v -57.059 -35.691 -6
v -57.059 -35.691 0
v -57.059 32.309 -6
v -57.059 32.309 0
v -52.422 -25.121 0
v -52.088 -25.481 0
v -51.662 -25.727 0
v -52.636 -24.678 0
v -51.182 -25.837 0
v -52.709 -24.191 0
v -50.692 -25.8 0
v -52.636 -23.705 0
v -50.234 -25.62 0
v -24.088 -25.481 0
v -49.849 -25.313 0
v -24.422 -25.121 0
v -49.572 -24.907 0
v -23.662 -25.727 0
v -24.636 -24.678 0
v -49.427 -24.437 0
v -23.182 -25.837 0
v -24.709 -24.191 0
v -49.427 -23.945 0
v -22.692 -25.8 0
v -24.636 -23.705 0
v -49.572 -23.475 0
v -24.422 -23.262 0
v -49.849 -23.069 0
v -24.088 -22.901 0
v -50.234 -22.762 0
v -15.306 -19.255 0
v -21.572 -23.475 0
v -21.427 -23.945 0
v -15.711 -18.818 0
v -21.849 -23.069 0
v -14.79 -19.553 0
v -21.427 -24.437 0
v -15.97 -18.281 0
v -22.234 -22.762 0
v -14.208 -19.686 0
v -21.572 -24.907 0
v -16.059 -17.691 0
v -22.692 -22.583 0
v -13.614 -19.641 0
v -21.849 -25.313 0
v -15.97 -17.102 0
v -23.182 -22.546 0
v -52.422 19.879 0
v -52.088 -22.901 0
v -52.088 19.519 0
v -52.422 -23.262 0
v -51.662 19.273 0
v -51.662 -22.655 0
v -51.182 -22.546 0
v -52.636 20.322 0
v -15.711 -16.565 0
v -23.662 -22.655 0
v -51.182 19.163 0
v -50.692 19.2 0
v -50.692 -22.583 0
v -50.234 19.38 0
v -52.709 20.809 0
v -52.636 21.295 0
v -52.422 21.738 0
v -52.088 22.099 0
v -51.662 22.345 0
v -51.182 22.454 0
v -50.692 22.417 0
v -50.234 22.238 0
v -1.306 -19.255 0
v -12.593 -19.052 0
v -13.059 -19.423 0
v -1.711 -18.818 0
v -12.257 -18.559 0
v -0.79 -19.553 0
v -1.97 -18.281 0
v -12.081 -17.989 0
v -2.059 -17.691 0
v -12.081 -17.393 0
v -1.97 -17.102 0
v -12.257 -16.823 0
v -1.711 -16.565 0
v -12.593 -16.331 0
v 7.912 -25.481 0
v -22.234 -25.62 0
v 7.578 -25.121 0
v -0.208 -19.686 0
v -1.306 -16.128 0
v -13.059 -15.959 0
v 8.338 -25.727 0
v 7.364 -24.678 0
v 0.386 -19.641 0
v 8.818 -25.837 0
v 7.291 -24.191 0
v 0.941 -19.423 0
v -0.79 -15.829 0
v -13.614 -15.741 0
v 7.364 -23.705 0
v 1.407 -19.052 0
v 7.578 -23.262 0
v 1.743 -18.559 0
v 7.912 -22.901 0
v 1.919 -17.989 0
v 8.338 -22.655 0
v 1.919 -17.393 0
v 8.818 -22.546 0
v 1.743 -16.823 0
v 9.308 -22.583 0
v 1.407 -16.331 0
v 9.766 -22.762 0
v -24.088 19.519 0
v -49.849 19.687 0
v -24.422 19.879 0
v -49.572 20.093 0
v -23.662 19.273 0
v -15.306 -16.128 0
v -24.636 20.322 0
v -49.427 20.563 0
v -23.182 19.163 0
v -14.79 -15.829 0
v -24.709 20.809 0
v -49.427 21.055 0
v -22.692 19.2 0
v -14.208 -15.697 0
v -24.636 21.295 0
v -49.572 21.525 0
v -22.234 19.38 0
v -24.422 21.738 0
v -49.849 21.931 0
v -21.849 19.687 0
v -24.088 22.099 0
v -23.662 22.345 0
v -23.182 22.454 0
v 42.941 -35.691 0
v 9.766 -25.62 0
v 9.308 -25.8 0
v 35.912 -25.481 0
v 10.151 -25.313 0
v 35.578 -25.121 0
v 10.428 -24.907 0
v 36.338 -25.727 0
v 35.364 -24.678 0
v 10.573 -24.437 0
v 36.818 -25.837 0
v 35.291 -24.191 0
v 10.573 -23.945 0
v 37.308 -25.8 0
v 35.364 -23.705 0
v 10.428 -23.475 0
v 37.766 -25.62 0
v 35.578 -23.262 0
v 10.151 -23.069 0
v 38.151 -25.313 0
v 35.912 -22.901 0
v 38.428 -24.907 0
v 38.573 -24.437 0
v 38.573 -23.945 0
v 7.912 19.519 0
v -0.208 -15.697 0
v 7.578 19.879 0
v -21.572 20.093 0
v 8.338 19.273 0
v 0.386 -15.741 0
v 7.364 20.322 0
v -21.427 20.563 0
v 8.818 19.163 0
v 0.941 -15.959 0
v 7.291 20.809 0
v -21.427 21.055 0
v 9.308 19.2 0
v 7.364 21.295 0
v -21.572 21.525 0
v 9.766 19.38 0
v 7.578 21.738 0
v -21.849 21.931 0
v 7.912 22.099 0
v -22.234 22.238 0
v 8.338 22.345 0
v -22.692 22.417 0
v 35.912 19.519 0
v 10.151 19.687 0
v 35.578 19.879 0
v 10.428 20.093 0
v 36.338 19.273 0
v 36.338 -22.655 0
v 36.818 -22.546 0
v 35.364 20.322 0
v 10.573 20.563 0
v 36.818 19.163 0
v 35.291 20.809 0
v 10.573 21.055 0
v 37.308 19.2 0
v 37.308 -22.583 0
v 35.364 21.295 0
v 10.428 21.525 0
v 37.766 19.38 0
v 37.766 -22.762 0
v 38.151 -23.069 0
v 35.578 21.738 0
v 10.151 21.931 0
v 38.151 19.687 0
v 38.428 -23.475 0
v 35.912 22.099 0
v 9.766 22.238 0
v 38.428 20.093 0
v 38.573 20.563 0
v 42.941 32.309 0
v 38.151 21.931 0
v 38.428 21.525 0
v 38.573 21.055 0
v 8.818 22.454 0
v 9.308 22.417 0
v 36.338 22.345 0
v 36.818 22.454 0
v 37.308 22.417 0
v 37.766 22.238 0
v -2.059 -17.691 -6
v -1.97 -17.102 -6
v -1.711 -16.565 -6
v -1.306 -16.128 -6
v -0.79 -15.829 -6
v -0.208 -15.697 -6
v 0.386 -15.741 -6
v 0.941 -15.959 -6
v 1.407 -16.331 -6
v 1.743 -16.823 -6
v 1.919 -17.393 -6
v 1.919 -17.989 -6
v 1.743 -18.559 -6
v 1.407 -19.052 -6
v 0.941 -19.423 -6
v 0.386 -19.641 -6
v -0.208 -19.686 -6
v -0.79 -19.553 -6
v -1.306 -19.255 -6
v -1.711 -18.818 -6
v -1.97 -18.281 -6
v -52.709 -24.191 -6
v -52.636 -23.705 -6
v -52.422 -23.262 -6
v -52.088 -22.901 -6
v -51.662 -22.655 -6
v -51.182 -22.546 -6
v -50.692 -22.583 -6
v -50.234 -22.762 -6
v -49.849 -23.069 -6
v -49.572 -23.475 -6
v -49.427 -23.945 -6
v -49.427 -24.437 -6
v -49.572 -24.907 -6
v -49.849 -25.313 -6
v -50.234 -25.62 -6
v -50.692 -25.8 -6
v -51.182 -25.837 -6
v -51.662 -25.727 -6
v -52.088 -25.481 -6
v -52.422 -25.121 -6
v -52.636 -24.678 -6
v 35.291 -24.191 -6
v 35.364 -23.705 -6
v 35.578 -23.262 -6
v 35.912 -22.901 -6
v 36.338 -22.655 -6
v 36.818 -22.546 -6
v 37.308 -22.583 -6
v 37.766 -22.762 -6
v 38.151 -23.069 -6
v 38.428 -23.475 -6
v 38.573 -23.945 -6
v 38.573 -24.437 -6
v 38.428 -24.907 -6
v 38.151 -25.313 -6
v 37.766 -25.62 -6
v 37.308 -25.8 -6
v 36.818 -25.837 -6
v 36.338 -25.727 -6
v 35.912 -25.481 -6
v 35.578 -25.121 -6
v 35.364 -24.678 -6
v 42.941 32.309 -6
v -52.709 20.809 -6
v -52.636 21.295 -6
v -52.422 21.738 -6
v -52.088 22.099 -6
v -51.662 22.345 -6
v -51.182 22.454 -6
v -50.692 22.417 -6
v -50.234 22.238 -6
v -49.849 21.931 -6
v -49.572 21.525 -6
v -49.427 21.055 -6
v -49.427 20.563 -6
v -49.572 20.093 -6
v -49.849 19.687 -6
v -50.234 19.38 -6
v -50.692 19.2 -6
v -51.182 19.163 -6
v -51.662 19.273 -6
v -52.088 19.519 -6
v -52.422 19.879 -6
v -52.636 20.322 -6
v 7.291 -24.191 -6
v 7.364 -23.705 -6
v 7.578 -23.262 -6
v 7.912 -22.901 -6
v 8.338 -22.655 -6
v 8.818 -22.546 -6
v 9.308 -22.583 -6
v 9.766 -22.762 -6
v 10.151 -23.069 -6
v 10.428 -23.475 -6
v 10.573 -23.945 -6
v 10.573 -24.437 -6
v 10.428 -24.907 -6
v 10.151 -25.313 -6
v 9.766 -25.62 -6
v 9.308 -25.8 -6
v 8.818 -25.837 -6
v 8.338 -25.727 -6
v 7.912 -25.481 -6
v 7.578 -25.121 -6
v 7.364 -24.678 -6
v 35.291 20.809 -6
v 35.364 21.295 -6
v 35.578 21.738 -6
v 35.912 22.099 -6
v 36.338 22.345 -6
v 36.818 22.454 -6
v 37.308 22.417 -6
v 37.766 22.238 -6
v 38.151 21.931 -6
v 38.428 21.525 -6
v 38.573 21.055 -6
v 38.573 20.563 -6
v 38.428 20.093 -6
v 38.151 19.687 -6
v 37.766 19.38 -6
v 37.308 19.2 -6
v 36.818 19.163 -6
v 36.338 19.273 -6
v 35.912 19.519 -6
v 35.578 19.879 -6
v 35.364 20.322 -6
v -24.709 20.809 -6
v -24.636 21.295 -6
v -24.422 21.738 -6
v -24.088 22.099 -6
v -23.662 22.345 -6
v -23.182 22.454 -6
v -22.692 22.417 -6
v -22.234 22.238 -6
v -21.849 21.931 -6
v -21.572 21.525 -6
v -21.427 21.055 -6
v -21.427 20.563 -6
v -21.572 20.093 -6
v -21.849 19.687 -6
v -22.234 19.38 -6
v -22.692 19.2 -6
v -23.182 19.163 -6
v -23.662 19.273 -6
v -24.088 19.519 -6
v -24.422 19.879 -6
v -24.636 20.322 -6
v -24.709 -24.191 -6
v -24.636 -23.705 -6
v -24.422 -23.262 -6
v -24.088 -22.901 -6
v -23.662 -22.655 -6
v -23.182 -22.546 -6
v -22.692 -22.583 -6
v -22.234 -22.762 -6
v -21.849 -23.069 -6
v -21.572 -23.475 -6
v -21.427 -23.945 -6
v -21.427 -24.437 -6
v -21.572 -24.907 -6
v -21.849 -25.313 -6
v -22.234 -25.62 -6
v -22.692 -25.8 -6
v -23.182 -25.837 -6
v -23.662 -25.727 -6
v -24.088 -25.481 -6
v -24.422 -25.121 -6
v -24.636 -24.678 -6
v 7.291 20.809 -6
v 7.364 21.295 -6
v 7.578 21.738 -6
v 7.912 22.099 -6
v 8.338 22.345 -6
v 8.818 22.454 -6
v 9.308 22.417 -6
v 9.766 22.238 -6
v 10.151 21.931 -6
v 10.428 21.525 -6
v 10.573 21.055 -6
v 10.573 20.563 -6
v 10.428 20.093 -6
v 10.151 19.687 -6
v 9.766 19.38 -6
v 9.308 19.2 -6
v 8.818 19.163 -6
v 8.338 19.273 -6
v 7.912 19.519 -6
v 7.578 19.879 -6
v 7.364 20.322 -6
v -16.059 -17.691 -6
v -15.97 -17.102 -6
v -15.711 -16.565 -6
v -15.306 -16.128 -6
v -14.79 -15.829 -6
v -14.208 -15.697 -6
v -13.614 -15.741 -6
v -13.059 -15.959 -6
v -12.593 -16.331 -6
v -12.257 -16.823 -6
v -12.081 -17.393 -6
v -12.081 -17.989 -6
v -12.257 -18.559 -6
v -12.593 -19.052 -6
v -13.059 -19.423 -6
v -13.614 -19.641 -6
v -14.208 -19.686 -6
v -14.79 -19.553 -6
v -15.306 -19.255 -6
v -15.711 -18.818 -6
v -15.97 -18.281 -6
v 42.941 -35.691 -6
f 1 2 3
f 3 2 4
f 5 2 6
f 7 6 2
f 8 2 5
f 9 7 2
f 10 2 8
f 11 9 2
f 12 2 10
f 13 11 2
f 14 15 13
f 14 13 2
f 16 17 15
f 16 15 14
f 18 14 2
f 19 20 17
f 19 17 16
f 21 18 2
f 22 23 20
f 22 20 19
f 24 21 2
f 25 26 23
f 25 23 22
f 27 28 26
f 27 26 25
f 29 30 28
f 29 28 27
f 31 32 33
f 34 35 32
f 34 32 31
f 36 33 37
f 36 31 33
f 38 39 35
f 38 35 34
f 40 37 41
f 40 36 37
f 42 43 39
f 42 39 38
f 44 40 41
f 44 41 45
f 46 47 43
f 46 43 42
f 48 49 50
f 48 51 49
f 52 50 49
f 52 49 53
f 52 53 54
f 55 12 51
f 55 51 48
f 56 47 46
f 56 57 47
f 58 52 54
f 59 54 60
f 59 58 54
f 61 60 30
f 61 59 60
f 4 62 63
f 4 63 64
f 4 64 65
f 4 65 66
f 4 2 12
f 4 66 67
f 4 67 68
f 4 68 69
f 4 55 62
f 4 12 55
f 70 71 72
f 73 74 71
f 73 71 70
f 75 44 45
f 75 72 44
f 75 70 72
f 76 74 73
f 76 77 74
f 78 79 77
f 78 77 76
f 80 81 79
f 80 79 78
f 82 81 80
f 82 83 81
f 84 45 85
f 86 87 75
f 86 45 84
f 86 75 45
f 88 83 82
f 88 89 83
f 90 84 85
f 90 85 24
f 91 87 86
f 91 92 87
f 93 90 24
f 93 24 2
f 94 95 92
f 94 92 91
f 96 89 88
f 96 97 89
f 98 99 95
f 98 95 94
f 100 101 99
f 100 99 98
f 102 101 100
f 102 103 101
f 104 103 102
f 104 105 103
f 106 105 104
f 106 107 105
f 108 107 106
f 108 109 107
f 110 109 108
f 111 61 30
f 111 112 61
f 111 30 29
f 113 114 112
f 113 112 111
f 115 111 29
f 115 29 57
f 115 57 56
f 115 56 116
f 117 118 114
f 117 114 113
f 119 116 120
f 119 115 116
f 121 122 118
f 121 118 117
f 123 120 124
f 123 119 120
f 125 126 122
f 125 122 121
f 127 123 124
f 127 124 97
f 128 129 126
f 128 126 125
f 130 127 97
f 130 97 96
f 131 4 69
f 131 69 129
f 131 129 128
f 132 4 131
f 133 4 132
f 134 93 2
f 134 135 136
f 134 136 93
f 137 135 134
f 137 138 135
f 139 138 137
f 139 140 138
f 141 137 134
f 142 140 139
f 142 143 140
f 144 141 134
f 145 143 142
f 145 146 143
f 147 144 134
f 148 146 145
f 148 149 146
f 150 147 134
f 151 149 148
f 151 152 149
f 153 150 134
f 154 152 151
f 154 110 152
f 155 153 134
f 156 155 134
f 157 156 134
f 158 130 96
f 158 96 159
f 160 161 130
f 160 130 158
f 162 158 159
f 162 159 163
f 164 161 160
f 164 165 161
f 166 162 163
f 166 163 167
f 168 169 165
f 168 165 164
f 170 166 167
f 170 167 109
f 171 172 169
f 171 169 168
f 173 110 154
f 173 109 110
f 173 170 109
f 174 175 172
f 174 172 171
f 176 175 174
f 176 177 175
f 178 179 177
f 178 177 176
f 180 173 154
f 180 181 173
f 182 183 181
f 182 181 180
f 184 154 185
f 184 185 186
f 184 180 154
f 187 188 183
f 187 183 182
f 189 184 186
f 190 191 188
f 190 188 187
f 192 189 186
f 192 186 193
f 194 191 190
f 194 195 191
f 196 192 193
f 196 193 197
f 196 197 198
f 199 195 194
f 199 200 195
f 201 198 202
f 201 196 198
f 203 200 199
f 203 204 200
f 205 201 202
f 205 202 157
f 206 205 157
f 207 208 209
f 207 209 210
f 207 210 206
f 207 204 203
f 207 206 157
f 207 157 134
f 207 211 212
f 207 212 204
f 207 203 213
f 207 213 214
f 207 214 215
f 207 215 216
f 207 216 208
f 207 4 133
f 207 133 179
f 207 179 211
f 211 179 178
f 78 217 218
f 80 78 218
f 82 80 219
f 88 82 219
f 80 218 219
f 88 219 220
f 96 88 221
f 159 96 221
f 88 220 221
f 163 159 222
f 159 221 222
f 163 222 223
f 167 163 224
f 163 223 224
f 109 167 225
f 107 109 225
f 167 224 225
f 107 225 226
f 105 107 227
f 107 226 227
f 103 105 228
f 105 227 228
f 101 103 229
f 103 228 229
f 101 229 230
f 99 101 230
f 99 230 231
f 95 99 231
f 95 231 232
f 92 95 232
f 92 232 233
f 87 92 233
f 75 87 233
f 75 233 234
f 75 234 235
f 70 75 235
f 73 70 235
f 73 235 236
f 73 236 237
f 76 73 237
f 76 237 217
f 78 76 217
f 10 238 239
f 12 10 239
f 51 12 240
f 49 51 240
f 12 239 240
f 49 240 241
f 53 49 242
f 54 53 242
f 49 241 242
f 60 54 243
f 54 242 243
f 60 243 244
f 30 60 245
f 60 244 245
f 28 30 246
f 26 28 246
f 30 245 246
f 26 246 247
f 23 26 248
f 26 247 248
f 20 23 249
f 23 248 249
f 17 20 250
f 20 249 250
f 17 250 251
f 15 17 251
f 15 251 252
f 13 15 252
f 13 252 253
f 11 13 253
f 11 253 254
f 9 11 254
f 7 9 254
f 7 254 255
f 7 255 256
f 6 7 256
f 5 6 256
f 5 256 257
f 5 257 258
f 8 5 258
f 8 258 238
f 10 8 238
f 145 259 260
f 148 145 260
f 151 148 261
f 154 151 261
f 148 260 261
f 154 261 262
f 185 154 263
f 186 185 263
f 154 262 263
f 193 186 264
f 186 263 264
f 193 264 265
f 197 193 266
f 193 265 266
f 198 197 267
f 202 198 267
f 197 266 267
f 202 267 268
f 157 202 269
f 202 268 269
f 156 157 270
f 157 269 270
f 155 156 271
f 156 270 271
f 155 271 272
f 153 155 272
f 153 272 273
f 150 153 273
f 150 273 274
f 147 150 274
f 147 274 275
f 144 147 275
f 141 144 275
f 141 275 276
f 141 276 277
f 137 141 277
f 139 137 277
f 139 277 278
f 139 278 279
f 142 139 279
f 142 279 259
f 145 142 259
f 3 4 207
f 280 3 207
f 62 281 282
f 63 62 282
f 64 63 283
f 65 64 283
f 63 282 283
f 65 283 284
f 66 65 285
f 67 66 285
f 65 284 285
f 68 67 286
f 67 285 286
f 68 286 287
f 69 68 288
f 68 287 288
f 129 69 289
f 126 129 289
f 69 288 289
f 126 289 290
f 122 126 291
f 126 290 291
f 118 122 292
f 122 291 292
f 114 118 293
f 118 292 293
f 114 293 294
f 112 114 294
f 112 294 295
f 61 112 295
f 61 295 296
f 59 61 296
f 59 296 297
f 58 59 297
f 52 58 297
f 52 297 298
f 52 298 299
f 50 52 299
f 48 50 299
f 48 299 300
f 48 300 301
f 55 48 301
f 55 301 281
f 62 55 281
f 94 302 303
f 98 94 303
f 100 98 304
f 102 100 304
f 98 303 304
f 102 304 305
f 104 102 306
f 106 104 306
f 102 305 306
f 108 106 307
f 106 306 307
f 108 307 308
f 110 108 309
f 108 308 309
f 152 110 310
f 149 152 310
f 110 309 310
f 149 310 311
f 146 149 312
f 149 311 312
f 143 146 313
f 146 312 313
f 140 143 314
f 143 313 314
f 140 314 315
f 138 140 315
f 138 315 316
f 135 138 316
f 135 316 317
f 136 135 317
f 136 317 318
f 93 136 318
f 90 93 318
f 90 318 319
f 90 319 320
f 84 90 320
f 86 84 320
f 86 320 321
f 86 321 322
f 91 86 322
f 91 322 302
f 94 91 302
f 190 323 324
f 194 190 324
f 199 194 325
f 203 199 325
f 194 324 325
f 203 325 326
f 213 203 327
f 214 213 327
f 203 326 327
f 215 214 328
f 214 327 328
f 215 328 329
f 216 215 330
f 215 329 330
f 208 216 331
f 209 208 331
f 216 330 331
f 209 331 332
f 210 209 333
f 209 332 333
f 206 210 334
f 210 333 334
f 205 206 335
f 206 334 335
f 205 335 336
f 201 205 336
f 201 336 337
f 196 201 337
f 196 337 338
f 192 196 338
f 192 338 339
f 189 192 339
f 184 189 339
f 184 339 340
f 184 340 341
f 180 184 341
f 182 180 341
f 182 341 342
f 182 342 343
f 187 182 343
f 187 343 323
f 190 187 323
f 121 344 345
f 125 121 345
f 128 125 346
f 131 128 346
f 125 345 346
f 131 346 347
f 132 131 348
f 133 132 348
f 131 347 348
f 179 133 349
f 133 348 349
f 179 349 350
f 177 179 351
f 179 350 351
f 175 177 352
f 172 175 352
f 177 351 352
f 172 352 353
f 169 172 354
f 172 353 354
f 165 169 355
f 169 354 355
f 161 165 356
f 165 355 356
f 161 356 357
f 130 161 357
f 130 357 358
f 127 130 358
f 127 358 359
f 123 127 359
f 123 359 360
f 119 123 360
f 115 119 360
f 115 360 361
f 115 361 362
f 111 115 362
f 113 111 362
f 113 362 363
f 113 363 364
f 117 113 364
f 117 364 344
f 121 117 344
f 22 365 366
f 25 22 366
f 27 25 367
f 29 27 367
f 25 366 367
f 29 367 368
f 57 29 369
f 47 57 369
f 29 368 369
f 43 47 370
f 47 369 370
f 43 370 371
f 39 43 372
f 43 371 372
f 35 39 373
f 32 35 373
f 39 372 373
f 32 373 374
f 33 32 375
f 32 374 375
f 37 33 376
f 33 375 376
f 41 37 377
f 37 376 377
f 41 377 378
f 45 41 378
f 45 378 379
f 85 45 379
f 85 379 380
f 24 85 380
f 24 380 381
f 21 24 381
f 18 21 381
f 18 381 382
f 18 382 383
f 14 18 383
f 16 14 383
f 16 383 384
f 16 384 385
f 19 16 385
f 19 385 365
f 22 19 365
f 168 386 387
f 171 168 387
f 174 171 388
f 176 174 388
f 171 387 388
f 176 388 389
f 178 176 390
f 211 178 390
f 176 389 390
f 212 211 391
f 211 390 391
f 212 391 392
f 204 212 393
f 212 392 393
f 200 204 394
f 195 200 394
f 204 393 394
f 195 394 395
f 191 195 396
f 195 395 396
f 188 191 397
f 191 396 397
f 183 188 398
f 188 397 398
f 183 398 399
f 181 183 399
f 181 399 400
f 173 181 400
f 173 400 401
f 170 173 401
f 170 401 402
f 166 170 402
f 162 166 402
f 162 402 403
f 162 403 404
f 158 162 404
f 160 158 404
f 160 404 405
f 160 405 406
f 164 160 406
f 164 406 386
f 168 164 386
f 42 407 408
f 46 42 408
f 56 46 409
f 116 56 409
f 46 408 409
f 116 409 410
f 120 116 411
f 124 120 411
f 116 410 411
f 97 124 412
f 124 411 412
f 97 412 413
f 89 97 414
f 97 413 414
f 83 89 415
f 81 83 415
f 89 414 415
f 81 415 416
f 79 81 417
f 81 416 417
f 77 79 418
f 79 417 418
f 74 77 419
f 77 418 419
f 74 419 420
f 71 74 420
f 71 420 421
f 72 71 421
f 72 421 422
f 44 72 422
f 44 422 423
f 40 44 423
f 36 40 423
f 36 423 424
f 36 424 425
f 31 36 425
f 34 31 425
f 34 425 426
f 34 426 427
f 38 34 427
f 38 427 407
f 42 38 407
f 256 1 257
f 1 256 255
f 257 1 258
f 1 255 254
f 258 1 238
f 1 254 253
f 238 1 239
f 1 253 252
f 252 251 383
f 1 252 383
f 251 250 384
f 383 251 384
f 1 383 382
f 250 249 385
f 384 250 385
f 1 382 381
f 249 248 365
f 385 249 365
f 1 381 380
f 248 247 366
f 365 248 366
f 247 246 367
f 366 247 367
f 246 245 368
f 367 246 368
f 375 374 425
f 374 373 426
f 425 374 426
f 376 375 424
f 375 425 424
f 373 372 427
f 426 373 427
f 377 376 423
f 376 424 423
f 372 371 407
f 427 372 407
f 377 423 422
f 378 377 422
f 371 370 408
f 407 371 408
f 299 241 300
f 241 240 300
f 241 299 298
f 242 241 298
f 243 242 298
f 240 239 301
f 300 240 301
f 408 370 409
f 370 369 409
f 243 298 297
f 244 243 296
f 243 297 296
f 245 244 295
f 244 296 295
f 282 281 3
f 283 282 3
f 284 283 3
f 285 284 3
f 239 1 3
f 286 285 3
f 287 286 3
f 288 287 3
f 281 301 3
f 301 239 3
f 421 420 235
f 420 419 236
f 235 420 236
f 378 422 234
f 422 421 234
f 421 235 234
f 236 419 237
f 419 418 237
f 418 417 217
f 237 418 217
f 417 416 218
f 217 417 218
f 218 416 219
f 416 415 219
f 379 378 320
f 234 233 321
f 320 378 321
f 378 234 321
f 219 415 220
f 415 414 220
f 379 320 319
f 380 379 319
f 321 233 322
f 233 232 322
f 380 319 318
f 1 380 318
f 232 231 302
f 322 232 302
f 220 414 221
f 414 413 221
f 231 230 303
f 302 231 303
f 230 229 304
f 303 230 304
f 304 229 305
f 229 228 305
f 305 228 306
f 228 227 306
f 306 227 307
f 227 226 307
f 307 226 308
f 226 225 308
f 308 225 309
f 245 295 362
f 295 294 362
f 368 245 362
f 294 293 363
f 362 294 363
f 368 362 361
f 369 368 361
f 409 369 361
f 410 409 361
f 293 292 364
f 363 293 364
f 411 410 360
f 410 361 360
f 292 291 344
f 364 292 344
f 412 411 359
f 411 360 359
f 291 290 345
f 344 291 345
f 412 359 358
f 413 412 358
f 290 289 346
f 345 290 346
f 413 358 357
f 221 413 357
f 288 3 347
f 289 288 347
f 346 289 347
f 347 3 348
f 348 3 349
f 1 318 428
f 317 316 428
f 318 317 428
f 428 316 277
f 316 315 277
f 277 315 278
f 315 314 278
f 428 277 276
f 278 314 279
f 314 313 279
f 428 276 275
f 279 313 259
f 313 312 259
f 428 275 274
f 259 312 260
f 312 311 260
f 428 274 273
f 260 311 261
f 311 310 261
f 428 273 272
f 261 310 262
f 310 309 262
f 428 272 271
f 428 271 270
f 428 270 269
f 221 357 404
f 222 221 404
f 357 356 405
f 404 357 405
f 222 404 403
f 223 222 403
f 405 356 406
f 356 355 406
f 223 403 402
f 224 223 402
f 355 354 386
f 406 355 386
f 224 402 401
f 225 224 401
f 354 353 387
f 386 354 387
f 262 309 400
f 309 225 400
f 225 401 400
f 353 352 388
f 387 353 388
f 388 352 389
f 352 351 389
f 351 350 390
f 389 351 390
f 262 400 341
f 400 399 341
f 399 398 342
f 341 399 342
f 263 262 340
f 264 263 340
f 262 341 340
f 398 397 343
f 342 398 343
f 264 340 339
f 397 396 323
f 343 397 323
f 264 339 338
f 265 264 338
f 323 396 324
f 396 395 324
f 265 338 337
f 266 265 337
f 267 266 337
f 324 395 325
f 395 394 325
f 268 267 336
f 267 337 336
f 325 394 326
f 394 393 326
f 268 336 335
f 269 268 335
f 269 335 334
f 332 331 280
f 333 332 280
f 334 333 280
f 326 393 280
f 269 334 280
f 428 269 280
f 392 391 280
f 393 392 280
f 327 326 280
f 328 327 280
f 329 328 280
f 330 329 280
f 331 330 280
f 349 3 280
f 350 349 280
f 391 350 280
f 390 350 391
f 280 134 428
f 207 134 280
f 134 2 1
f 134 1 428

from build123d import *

# Parameters (mm, degrees)
F0_W     = 100
F0_H     = 68
F1_DEPTH = 6
F2_D     = 3.3
F3_D     = 4


with BuildPart() as f1:
    # F0 (on Top) → F1 (new body)
    with BuildSketch(Plane.XY):
        with Locations((-7.0588196459, -1.6911783814)):
            Rectangle(F0_W, F0_H)
    extrude(amount=-F1_DEPTH)

    # F2 (through all)
    with Locations(Plane.XY):
        with Locations((-51.0588196459, 20.8088216186), (-23.0588196459, 20.8088216186), (-51.0588196459, -24.1911783814), (-23.0588196459, -24.1911783814), (8.9411803541, 20.8088216186), (36.9411803541, 20.8088216186), (8.9411803541, -24.1911783814), (36.9411803541, -24.1911783814)):
            Hole(F2_D / 2)

    # F3 (through all)
    with Locations(Plane.XY):
        with Locations((-14.0588196459, -17.6911783814), (-0.0588196459, -17.6911783814)):
            Hole(F3_D / 2)


solid = f1.part
